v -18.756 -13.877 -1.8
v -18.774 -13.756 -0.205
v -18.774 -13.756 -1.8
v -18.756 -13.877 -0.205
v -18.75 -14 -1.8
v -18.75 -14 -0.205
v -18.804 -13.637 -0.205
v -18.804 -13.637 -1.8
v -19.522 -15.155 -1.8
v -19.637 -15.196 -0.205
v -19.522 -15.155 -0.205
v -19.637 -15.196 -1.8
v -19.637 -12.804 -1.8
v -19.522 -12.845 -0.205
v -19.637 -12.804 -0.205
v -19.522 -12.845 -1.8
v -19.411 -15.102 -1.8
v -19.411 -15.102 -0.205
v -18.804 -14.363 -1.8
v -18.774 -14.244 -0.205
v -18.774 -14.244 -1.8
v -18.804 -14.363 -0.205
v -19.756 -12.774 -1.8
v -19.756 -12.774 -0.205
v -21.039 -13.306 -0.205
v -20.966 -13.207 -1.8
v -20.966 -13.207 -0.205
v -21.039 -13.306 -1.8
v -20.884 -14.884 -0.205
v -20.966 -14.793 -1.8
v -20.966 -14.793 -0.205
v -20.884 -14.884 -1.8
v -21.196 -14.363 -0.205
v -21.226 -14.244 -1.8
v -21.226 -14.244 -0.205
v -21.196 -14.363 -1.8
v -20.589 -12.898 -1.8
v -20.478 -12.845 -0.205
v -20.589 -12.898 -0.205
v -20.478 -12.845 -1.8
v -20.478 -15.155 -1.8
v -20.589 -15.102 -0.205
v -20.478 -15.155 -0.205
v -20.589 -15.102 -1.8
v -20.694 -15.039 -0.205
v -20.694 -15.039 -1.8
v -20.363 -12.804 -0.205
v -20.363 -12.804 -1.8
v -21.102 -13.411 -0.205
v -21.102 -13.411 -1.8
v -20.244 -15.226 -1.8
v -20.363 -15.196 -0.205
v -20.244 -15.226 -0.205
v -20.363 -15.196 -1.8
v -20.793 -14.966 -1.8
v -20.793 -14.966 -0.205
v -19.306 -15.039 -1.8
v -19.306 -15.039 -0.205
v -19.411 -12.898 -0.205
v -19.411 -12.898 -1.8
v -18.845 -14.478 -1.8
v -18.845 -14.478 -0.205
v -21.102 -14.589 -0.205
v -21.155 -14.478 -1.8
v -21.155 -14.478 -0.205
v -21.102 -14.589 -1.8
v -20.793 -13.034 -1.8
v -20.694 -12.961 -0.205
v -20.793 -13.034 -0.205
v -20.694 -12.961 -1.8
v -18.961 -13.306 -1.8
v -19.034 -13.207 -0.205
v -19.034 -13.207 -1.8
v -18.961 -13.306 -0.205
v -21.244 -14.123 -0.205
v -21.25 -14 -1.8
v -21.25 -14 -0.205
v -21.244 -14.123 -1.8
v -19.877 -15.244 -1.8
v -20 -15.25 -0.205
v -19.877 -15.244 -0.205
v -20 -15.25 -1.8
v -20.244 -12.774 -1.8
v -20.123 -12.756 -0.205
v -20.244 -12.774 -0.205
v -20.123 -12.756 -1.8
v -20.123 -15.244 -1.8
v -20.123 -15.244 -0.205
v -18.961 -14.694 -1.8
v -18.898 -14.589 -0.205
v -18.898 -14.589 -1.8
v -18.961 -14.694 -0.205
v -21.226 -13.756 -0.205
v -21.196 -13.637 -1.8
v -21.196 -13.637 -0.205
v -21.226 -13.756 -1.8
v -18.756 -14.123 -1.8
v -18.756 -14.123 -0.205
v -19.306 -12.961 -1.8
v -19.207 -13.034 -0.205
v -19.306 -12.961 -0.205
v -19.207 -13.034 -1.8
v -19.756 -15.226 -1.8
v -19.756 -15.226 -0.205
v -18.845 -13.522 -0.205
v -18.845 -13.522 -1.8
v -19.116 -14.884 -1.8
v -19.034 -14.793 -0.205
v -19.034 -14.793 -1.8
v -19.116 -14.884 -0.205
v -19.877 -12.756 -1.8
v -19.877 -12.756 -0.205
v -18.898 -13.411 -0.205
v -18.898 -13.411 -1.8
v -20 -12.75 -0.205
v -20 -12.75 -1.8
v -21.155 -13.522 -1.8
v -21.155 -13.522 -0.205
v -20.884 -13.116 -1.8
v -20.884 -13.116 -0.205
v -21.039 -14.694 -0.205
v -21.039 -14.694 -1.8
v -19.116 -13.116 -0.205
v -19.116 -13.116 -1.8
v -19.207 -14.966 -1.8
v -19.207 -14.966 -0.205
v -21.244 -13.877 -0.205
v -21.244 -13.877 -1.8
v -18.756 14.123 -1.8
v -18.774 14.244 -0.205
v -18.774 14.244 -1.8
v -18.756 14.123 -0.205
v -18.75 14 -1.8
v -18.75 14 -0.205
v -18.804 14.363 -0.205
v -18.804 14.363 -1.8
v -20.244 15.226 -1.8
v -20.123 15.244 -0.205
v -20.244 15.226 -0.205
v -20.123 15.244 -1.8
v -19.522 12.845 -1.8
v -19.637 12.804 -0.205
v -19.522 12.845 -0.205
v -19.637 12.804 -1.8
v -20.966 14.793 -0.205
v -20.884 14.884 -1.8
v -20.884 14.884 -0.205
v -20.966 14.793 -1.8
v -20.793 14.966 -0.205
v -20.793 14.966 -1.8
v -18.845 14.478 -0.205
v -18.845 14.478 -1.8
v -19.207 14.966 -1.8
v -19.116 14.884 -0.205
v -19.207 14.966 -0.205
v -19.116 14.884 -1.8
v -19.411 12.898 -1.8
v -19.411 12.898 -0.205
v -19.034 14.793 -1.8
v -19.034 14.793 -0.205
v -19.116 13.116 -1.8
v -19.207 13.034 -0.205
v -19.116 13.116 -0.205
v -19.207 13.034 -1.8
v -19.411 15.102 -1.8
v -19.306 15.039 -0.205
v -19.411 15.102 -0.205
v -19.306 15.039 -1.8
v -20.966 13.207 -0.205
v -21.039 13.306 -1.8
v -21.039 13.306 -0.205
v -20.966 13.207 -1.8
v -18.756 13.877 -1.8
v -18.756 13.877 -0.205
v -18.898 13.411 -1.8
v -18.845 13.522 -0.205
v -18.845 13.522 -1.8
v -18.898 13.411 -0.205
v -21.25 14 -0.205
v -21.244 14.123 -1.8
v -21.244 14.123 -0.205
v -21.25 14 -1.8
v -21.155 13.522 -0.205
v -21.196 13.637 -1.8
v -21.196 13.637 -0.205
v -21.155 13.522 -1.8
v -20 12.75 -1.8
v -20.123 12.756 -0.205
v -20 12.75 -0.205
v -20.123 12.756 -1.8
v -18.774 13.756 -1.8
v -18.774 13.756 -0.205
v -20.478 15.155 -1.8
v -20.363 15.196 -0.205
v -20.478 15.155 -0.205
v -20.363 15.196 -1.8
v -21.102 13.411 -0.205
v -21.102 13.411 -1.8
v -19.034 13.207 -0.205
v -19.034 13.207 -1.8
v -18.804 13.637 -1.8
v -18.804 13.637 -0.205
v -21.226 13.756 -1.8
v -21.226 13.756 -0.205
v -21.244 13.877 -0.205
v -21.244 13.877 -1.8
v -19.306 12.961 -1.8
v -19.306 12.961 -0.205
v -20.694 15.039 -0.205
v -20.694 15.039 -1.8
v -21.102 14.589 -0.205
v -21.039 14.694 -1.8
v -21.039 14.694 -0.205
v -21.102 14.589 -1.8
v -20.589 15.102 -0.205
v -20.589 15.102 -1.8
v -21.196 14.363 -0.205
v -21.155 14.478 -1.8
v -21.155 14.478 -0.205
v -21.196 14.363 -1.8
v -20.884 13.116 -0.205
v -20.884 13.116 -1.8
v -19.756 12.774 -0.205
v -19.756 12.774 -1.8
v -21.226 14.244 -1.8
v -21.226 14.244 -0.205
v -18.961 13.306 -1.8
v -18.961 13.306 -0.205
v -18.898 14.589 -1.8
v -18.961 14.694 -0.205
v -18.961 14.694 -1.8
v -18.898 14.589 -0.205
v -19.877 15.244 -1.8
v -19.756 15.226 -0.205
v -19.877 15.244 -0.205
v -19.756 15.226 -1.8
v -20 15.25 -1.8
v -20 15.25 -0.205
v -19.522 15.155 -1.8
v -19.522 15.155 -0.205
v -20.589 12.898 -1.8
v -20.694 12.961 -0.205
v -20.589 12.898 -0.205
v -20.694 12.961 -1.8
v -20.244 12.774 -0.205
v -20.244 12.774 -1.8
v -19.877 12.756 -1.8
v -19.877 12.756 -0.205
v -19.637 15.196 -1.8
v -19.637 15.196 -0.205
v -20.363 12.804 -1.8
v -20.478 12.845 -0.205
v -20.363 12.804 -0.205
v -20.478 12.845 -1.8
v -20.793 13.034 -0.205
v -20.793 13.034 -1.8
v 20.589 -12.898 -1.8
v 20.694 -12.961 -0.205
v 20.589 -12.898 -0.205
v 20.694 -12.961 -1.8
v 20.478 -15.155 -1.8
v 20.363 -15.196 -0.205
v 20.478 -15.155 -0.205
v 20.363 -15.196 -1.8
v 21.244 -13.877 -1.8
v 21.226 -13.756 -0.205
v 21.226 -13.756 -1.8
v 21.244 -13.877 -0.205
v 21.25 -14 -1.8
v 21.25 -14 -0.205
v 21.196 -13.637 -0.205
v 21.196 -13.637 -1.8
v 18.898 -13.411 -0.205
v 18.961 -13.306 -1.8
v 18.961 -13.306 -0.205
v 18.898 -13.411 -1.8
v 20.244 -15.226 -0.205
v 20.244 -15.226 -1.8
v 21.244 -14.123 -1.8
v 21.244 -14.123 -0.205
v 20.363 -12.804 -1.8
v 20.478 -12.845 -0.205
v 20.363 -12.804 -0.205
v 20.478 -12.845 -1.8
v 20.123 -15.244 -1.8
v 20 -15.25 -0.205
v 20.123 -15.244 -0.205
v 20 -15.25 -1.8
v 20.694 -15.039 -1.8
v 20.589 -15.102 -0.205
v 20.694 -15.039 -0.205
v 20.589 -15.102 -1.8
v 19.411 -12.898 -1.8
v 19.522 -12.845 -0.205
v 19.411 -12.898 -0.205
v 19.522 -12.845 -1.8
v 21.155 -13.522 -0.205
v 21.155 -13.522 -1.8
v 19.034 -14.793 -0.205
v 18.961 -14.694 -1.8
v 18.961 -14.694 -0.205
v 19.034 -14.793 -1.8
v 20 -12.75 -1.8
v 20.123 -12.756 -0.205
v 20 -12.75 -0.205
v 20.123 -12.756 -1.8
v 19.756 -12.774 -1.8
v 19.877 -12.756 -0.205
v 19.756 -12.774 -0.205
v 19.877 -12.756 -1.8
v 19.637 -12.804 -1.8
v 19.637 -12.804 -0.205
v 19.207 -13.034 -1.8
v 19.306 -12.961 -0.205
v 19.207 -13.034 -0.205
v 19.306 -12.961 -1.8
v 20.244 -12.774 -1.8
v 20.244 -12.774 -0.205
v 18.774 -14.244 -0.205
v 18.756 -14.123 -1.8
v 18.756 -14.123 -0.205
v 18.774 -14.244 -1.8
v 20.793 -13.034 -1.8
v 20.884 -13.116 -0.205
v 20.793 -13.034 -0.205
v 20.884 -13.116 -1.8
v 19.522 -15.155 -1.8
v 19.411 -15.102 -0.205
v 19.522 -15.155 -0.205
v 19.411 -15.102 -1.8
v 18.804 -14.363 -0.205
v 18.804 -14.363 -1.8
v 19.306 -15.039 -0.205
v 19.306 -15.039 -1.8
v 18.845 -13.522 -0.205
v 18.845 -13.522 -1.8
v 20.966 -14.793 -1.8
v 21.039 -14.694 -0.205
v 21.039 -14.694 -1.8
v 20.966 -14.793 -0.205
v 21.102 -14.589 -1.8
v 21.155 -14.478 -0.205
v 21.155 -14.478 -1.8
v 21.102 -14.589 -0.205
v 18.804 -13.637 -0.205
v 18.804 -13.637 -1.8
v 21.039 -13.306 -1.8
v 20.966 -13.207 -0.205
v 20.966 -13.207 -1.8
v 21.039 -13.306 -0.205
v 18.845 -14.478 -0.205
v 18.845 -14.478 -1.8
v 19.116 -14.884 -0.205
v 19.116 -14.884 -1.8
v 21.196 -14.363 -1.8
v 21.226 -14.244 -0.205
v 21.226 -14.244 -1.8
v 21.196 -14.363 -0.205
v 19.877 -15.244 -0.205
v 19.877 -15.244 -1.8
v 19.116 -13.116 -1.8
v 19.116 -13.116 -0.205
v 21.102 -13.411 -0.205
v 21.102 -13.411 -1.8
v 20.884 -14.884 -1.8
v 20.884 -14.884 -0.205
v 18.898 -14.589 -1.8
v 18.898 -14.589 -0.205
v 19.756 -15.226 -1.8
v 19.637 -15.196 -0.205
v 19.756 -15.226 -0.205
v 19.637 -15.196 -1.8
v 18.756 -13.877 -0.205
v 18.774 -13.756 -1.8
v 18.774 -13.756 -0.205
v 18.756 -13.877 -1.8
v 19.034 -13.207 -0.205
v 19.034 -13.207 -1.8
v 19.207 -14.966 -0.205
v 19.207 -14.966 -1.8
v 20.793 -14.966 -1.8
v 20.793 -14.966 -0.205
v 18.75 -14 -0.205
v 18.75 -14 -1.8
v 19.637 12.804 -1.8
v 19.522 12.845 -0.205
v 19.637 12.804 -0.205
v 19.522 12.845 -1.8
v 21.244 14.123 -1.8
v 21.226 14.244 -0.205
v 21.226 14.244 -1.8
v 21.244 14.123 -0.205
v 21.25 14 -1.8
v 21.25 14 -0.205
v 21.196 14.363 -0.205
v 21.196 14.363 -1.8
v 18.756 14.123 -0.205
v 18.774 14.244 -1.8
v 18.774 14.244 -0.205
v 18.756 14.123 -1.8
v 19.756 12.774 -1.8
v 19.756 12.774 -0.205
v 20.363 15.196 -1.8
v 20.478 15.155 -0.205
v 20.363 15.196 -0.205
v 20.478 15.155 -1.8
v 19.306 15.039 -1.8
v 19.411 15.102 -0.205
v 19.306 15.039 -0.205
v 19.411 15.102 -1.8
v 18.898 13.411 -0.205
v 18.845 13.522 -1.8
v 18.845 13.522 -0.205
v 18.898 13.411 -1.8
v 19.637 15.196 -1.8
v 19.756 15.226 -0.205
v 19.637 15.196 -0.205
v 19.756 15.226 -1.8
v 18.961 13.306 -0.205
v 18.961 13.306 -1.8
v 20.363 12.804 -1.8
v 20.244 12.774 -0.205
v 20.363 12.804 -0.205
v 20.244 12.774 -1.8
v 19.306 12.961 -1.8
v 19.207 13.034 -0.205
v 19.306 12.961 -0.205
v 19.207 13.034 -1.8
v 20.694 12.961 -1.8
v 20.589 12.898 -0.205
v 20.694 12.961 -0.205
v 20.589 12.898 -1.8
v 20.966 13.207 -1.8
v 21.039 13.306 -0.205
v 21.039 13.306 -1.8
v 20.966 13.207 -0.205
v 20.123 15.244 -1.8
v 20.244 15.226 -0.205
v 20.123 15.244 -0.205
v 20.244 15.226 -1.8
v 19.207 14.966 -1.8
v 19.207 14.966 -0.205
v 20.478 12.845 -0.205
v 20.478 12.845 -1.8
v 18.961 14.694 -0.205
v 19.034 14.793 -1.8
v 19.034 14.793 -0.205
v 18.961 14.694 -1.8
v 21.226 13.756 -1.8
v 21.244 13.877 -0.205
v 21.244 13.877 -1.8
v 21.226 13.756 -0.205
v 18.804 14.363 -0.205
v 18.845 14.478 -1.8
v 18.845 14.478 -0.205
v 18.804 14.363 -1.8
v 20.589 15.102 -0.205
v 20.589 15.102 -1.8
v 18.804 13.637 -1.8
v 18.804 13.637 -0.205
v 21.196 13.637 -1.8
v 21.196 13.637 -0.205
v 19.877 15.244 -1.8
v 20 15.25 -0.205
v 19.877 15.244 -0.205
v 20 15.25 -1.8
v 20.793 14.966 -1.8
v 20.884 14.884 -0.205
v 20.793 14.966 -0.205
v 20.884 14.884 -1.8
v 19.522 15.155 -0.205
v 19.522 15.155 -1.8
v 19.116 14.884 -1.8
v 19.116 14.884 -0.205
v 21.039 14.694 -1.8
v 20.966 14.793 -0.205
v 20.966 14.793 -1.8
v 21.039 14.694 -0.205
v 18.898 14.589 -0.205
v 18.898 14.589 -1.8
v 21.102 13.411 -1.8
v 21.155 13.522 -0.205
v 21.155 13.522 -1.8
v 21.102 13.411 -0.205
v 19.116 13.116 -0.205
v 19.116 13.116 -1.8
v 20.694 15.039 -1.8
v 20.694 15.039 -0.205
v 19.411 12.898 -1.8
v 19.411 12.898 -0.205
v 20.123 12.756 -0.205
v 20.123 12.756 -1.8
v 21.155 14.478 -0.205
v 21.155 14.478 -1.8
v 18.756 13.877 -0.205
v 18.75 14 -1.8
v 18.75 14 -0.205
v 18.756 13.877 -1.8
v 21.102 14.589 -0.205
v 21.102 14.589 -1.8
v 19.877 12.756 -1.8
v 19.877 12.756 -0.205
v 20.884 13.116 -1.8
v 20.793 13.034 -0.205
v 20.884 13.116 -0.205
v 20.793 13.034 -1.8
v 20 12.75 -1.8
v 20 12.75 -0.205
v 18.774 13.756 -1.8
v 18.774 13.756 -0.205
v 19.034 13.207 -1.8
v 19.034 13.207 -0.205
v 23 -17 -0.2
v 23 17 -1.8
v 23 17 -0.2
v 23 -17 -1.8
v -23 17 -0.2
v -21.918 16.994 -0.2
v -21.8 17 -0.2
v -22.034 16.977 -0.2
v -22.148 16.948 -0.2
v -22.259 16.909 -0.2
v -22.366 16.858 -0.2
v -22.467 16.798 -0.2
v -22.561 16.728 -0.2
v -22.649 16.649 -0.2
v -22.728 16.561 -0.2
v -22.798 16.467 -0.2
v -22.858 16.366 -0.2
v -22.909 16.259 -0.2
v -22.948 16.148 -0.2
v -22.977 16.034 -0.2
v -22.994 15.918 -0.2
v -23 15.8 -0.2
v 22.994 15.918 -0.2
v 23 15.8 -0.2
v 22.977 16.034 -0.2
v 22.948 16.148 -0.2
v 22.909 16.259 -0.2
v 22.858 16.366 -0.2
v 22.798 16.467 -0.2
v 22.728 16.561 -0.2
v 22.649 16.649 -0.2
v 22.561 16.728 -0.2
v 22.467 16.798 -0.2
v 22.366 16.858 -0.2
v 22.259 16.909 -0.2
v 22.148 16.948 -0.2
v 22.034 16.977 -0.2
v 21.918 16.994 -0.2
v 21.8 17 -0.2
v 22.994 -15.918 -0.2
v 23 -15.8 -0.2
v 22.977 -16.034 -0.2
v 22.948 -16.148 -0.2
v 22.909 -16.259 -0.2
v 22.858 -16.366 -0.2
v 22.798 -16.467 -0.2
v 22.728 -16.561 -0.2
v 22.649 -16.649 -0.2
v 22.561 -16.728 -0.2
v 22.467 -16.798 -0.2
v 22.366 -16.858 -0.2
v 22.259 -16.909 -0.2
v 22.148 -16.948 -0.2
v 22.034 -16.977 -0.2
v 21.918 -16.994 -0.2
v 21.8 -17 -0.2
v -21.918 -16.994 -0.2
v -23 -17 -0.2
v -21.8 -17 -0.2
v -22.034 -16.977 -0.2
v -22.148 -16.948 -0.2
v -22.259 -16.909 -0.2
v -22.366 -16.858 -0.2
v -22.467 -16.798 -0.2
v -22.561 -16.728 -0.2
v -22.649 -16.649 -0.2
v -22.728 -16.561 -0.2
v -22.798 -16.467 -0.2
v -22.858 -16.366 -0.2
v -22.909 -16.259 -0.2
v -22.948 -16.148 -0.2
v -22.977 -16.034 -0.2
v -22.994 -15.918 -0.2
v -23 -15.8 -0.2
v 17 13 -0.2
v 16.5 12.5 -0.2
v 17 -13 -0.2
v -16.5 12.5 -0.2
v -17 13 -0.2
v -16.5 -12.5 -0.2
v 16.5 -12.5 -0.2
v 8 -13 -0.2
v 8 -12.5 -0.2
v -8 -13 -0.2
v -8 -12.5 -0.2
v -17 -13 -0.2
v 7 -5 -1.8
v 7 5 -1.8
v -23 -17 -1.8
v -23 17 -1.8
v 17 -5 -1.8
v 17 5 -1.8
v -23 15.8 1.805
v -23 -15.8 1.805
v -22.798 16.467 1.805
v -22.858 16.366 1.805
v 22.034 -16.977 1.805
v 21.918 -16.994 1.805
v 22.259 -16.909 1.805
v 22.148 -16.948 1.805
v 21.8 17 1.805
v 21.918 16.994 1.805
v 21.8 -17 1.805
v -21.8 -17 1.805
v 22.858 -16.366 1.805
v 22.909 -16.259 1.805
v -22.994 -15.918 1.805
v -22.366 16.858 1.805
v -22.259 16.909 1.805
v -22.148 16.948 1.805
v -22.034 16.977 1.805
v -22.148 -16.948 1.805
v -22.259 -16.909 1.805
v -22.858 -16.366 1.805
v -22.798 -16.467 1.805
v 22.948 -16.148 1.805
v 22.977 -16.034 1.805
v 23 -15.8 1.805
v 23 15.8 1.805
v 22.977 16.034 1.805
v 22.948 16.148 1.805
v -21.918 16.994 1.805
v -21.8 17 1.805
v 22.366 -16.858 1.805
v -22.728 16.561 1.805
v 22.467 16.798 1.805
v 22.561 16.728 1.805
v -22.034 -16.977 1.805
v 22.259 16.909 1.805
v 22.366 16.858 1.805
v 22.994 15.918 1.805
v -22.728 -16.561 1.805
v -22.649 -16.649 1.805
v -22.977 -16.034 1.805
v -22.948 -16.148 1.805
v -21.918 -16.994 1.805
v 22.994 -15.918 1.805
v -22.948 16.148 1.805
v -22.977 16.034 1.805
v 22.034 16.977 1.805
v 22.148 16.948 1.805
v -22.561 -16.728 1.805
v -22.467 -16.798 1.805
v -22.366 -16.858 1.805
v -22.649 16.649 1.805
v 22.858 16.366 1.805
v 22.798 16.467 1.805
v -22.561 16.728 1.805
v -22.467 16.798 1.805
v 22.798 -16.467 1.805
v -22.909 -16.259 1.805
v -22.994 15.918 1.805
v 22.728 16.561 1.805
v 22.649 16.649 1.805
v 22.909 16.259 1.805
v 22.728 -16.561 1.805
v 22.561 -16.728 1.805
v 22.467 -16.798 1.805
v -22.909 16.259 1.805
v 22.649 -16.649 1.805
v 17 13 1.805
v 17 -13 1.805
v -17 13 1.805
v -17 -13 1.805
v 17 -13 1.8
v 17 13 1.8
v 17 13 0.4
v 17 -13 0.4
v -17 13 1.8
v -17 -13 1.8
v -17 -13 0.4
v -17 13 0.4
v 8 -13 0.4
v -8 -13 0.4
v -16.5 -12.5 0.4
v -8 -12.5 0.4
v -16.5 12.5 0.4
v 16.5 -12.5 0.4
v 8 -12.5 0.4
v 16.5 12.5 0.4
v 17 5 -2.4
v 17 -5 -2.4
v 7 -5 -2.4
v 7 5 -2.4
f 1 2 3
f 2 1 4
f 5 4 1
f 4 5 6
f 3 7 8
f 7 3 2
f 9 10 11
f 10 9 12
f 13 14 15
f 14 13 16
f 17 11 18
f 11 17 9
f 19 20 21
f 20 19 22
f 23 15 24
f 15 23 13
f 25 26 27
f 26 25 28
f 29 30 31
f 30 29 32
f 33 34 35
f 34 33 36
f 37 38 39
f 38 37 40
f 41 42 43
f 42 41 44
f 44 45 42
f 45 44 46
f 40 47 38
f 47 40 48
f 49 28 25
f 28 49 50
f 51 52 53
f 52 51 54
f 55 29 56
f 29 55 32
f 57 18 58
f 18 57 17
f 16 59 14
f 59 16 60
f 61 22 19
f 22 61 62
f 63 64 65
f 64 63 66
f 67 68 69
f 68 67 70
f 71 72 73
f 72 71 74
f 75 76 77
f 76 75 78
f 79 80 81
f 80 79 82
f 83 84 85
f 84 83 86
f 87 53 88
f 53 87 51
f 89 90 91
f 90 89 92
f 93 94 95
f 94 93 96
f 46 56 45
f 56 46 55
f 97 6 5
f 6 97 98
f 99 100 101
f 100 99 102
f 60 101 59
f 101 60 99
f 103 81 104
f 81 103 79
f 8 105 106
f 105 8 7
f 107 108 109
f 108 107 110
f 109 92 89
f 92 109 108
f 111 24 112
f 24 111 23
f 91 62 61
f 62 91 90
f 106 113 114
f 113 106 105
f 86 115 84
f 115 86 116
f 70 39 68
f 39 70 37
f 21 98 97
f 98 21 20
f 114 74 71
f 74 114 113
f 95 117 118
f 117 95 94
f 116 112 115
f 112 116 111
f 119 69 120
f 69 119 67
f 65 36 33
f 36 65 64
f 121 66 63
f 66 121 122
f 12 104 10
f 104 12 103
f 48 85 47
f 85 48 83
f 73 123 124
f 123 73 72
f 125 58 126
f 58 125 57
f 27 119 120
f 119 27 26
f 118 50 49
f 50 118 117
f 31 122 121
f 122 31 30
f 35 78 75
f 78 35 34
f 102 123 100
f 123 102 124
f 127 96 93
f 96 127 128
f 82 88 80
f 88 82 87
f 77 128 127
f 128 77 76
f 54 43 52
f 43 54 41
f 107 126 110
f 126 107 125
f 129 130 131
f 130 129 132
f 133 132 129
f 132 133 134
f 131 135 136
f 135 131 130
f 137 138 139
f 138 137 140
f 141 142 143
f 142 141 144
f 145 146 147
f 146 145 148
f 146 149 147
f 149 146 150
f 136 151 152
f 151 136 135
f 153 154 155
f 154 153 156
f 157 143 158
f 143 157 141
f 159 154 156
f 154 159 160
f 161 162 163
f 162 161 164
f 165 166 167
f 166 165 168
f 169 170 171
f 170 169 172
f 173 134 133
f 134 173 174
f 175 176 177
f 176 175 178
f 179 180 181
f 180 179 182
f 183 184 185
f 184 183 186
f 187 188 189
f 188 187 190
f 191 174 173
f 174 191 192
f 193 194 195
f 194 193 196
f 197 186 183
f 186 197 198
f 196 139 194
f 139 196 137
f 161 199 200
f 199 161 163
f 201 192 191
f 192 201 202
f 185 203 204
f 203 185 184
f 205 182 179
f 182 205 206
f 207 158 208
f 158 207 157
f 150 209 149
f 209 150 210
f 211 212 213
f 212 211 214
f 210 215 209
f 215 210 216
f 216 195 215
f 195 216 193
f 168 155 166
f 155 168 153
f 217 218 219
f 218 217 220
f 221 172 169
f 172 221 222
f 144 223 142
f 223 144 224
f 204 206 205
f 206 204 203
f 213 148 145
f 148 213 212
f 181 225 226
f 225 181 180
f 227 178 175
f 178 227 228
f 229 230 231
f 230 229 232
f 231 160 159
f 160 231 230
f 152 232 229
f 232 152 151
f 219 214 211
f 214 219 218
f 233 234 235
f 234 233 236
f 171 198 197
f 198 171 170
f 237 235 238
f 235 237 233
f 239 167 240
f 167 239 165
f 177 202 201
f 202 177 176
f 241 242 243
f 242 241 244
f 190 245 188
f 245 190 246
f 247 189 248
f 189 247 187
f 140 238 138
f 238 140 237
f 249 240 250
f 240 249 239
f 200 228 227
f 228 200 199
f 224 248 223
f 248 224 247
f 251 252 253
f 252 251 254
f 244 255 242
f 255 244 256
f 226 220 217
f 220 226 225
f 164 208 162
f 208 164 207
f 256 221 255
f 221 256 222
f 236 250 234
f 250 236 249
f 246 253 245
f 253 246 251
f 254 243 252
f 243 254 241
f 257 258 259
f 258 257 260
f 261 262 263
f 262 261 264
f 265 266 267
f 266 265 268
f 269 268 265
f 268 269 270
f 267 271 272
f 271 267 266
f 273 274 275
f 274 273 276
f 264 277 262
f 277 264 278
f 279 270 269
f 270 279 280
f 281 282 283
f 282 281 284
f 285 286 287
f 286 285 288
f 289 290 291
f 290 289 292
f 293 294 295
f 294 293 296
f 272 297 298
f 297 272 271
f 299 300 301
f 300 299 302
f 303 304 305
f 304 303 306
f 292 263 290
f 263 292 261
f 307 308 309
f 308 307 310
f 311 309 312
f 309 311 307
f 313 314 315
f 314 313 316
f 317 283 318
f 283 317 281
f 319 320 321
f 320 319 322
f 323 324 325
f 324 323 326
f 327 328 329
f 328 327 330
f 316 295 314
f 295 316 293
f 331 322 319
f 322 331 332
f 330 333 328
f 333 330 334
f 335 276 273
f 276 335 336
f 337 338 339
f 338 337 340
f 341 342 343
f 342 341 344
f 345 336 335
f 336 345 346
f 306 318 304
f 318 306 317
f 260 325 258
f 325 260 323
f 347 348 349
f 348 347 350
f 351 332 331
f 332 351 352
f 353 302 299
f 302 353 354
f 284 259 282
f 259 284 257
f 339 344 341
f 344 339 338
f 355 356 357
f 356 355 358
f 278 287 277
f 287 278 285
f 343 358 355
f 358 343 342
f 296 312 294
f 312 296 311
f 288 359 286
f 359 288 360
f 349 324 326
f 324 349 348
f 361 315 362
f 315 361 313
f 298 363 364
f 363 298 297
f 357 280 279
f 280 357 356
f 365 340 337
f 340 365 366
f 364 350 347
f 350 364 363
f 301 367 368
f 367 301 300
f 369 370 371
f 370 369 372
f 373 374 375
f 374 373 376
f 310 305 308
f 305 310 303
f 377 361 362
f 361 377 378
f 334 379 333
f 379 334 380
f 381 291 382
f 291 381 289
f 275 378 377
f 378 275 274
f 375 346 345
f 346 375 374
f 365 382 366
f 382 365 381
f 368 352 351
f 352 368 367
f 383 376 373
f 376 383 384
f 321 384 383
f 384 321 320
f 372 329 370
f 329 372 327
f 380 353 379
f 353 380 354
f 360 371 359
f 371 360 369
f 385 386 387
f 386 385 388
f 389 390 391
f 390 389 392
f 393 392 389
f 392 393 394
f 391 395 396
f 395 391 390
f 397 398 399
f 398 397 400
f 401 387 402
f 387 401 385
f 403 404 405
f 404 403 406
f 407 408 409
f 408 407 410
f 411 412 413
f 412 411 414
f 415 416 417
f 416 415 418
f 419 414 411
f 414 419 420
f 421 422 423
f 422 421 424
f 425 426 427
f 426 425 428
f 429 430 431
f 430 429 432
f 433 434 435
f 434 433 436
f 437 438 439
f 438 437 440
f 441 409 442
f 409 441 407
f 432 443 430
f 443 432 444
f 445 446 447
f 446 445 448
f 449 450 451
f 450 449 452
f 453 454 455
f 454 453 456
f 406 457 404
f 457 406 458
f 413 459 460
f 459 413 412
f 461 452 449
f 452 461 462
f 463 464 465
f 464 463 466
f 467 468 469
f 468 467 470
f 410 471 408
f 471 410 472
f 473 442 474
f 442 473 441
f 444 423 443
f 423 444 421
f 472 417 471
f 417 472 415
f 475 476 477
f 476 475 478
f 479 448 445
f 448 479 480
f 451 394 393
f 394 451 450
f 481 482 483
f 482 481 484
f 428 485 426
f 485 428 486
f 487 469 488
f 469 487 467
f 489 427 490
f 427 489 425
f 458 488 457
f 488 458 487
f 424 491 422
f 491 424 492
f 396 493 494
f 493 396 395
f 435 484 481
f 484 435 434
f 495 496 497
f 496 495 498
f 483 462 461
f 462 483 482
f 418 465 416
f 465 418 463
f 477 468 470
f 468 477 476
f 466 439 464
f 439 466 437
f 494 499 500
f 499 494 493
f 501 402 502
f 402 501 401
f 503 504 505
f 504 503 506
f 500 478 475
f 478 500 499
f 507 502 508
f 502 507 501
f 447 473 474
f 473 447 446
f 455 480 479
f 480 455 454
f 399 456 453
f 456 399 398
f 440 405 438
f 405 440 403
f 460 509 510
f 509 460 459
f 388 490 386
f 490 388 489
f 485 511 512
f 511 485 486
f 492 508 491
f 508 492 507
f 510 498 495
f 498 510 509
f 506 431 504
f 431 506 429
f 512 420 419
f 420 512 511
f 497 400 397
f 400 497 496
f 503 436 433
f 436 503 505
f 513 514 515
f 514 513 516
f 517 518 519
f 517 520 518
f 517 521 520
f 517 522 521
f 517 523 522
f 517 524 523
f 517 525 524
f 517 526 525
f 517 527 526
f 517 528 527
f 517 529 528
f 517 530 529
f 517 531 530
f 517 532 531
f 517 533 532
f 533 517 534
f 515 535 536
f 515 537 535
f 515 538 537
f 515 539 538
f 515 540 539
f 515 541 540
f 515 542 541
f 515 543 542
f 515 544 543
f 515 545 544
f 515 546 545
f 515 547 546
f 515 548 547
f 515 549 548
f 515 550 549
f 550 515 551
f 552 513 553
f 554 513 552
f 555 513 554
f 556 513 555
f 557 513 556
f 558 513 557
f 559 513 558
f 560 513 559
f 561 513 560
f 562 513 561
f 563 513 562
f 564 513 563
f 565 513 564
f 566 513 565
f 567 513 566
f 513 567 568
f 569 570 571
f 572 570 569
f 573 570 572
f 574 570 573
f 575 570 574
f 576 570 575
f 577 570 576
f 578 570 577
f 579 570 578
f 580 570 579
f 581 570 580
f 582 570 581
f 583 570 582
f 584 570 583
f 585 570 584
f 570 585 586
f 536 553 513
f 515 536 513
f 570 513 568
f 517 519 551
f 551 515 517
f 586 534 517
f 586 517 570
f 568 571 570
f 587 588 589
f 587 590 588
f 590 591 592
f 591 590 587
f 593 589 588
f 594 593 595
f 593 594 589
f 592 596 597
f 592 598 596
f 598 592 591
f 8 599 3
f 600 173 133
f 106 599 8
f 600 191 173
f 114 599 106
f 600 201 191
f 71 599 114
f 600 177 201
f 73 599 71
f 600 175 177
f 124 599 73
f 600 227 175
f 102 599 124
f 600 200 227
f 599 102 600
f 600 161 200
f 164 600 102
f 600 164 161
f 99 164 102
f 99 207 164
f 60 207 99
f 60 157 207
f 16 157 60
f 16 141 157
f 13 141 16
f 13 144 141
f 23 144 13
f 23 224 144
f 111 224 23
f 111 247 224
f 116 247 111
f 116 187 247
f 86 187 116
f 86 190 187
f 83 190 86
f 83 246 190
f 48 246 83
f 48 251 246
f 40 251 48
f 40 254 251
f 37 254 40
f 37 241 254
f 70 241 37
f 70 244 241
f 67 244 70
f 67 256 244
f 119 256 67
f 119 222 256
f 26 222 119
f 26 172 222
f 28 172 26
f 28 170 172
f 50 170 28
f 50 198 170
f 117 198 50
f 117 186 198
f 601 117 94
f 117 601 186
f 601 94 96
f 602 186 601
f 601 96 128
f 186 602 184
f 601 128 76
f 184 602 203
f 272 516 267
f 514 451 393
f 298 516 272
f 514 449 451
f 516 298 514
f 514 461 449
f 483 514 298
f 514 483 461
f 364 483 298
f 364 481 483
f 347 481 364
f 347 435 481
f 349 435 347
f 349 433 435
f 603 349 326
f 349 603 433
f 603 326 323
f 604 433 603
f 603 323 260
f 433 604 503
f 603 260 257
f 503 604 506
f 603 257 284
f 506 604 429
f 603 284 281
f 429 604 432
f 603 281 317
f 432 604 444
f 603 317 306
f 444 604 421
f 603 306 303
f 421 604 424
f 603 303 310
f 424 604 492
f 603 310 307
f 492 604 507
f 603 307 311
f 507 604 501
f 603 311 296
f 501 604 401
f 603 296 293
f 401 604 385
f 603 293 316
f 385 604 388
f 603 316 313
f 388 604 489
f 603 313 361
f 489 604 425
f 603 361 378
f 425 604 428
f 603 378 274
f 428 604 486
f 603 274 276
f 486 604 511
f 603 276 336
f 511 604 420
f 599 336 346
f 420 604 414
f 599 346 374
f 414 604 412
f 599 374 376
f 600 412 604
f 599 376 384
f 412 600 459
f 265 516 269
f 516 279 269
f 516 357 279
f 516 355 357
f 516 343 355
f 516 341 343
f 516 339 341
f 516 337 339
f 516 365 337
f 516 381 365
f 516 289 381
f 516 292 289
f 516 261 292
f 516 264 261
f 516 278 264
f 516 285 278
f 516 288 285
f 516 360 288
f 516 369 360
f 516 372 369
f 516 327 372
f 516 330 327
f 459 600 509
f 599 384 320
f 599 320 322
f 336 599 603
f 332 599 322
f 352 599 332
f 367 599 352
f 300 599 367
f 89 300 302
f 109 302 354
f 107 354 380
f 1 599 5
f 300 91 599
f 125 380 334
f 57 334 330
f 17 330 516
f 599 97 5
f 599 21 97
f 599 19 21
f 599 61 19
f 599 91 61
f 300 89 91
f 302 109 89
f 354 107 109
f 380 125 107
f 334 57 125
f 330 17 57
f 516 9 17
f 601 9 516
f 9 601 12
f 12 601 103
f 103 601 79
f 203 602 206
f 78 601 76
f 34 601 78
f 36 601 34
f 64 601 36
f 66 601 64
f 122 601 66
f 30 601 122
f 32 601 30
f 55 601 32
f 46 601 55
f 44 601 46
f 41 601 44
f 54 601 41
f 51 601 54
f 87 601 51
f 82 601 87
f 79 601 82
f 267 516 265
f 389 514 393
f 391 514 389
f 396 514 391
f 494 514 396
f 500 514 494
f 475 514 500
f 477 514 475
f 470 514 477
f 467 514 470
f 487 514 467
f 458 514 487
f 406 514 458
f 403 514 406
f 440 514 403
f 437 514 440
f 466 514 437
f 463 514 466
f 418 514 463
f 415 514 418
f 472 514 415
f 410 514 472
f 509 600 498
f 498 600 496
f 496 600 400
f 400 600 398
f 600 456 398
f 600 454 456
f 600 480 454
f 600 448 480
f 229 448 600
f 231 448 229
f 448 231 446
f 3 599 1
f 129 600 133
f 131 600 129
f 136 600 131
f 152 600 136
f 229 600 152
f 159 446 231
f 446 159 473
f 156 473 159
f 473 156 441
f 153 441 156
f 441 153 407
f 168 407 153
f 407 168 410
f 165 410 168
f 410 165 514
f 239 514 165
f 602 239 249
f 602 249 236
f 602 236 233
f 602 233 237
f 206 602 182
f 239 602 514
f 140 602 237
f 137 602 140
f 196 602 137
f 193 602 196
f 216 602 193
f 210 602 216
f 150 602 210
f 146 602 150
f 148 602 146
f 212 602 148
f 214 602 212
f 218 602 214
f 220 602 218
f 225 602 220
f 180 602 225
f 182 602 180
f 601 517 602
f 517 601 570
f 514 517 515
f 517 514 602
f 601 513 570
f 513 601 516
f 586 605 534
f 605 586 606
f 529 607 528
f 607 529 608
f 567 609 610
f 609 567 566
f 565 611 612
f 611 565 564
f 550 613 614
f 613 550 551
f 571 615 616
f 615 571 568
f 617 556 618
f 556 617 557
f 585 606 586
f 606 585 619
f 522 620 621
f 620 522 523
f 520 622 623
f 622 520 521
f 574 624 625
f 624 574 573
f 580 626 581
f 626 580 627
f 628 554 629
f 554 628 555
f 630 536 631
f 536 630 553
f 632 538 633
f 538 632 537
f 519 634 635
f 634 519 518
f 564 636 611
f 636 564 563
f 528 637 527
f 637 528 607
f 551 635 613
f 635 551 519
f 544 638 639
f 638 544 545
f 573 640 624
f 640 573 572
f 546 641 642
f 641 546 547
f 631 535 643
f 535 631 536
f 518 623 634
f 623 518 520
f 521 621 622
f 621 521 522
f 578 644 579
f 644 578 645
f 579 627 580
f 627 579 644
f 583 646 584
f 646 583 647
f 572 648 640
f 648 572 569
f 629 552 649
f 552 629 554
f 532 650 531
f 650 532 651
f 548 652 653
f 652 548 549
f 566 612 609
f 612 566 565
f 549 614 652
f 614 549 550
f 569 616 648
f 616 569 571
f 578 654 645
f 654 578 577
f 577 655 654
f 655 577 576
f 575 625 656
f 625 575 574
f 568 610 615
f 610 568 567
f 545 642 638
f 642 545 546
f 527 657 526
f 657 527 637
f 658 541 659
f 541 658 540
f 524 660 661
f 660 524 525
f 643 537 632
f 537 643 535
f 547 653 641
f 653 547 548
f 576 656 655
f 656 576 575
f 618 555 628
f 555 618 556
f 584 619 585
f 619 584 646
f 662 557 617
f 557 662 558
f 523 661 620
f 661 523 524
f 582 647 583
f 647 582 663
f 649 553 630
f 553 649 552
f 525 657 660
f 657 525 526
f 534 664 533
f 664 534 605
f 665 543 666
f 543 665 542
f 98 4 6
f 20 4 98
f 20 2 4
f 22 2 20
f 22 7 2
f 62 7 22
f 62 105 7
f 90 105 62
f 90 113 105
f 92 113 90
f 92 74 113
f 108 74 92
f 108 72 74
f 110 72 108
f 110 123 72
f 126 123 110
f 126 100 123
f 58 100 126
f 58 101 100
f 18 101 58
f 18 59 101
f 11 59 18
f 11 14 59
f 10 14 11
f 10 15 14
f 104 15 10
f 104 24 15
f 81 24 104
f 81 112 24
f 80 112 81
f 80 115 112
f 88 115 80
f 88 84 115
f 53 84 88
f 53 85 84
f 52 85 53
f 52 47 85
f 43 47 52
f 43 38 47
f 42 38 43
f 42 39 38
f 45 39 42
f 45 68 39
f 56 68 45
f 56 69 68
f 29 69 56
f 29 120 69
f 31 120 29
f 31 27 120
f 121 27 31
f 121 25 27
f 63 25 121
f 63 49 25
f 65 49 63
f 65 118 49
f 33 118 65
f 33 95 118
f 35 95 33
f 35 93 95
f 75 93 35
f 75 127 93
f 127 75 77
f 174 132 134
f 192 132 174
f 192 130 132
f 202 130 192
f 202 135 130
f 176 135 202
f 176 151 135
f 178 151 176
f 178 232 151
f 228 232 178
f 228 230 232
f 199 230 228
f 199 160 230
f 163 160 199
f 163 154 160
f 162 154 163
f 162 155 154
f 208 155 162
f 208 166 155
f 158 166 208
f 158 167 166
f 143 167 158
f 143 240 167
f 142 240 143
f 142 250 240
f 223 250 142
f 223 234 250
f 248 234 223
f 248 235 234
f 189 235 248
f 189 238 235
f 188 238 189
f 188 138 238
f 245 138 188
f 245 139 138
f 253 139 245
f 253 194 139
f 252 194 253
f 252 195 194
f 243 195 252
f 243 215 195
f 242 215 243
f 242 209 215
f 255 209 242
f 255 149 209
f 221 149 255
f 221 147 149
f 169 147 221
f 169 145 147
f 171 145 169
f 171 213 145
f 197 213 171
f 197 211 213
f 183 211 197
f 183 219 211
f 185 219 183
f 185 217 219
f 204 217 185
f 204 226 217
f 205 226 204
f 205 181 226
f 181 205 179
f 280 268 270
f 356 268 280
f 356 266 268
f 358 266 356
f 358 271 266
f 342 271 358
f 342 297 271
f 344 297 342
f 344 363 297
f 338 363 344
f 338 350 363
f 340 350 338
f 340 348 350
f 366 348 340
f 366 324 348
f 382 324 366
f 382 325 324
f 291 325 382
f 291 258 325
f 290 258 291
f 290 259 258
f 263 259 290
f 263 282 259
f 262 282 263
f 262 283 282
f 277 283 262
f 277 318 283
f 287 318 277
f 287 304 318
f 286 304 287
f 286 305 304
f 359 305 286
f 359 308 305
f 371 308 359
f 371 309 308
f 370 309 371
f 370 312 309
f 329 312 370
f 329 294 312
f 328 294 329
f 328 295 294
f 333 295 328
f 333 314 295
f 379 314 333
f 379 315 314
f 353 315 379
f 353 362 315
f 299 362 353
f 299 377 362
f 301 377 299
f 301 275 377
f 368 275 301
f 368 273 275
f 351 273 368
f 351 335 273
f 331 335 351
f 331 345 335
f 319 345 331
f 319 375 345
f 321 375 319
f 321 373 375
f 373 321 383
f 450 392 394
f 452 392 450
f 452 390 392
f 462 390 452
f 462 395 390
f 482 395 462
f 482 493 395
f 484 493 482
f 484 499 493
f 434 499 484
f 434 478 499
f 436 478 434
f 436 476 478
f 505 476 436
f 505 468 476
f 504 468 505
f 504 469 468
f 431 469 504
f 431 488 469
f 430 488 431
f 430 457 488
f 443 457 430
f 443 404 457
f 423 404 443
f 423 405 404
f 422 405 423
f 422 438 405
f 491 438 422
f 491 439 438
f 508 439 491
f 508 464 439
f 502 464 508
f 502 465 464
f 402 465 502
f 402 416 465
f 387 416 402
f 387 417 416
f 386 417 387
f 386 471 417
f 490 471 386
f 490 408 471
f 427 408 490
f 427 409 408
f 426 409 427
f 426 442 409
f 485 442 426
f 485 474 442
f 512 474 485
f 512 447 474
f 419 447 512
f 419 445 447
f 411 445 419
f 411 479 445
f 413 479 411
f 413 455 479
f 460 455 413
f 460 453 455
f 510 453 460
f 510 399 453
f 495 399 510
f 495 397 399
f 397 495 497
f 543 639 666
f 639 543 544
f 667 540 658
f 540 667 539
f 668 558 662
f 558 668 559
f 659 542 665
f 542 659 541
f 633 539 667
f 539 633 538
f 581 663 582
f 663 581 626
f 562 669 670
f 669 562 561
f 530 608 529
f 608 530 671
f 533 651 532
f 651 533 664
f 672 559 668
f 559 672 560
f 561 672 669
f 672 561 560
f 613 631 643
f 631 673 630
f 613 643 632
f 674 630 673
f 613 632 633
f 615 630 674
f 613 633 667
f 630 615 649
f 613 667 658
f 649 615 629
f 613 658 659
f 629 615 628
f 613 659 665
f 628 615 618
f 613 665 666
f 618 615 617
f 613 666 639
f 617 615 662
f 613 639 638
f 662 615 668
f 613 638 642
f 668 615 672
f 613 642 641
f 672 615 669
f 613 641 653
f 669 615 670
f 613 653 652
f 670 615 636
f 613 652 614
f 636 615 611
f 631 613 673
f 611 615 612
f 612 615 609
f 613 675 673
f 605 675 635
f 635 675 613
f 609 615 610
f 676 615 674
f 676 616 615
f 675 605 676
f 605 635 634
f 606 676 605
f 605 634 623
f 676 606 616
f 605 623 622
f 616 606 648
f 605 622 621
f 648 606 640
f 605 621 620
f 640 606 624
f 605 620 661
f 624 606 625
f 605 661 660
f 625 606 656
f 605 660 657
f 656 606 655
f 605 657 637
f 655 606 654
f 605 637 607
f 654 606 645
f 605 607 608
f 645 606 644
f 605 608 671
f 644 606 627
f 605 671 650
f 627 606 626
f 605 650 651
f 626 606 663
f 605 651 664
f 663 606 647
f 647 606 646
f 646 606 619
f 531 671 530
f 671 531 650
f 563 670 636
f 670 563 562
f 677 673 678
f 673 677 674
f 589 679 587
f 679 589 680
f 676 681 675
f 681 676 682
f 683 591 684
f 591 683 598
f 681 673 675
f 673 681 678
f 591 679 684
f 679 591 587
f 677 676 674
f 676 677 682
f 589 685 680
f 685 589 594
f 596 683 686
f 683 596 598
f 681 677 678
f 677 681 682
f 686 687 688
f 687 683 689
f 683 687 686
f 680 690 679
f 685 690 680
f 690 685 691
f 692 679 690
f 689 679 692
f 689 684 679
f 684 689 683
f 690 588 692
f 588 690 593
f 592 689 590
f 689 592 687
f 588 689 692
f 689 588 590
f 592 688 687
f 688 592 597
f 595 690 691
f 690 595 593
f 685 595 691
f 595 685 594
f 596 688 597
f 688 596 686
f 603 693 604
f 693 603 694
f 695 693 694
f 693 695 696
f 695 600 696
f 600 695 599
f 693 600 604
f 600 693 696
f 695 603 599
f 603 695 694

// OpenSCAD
$fn = 64;

// =====================
// Parameters (mm)
// =====================
overall_width_mm  = 46.0;   // X
overall_height_mm = 34.0;   // Y
overall_thickness_mm = 6.0; // Z total envelope

pcb_thickness_mm = 1.6;
front_bezel_thickness_mm = 2.0;
bezel_border_mm = 3.0;

screen_aperture_width_mm  = 34.0;
screen_aperture_height_mm = 26.0;
screen_aperture_offset_x_mm = 0.0;
screen_aperture_offset_y_mm = 0.0;

screen_window_thickness_mm = 0.8;
display_layer_thickness_mm = 1.2;

mounting_hole_diameter_mm = 2.5;
mounting_hole_edge_margin_mm = 3.0;

overlap_mm = 0.6;

// Simple connector/FPC feature (approx)
fpc_w_mm = 16.0;
fpc_h_mm = 6.0;
fpc_t_mm = 1.2;
fpc_edge_margin_mm = 2.0;

// =====================
// Derived / sanity
// =====================
module_thickness_mm = pcb_thickness_mm + front_bezel_thickness_mm; // physical stack we model
z0 = -module_thickness_mm/2; // bottom of PCB
pcb_zc   = z0 + pcb_thickness_mm/2;
bezel_zc = z0 + pcb_thickness_mm + front_bezel_thickness_mm/2;

screen_window_zc = z0 + pcb_thickness_mm + front_bezel_thickness_mm - screen_window_thickness_mm/2;
display_layer_zc = z0 + pcb_thickness_mm + front_bezel_thickness_mm - screen_window_thickness_mm - display_layer_thickness_mm/2;

// Keep within requested overall thickness envelope (6mm) by centering the modeled stack
z_shift = 0; // already centered by z0 definition

// =====================
// Geometry helpers
// =====================
module rounded_rect_prism(size=[10,10,1], r=1, center=true) {
    // Minkowski rounded rectangle prism
    // size is outer size; r is corner radius
    sx = size[0]; sy = size[1]; sz = size[2];
    rr = min(r, min(sx,sy)/2 - 0.01);
    translate(center ? [0,0,0] : [sx/2, sy/2, sz/2])
        minkowski() {
            cube([sx-2*rr, sy-2*rr, sz], center=true);
            cylinder(r=rr, h=0.01, center=true);
        }
}

// =====================
// TFT Module (single connected solid)
// =====================
module tft_module() {
    union() {
        // --- PCB with mounting holes (holes are subtracted but solid remains connected)
        difference() {
            color([0.0, 0.45, 0.2])
                translate([0,0,pcb_zc + z_shift])
                    cube([overall_width_mm, overall_height_mm, pcb_thickness_mm], center=true);

            for (x = [-1, 1], y = [-1, 1]) {
                translate([
                    x*(overall_width_mm/2 - mounting_hole_edge_margin_mm),
                    y*(overall_height_mm/2 - mounting_hole_edge_margin_mm),
                    pcb_zc + z_shift
                ])
                    cylinder(r=mounting_hole_diameter_mm/2, h=pcb_thickness_mm + 2*overlap_mm, center=true);
            }
        }

        // --- Bezel frame (with screen aperture cutout)
        difference() {
            color([0.05, 0.05, 0.05])
                translate([0,0,bezel_zc + z_shift])
                    rounded_rect_prism([overall_width_mm, overall_height_mm, front_bezel_thickness_mm], r=1.2, center=true);

            // Screen aperture cut
            translate([screen_aperture_offset_x_mm, screen_aperture_offset_y_mm, bezel_zc + z_shift])
                cube([screen_aperture_width_mm, screen_aperture_height_mm, front_bezel_thickness_mm + 2*overlap_mm], center=true);
        }

        // --- Screen window (glass) - slightly recessed into bezel, overlaps for watertight union
        color([0.15, 0.15, 0.18, 0.9])
            translate([screen_aperture_offset_x_mm, screen_aperture_offset_y_mm, screen_window_zc + z_shift - overlap_mm/2])
                cube([screen_aperture_width_mm, screen_aperture_height_mm, screen_window_thickness_mm + overlap_mm], center=true);

        // --- Display layer behind glass (dark)
        color([0.02, 0.02, 0.02])
            translate([screen_aperture_offset_x_mm, screen_aperture_offset_y_mm, display_layer_zc + z_shift - overlap_mm/2])
                cube([screen_aperture_width_mm - 1.0, screen_aperture_height_mm - 1.0, display_layer_thickness_mm + overlap_mm], center=true);

        // --- Simple FPC/connector feature on back side (connected to PCB)
        // Place at bottom edge (negative Y) on PCB top surface, protruding slightly upward.
        fpc_zc = (z0 + pcb_thickness_mm) + fpc_t_mm/2 - overlap_mm; // overlaps into PCB
        fpc_yc = -overall_height_mm/2 + fpc_h_mm/2 + fpc_edge_margin_mm;
        color([0.85, 0.75, 0.2])
            translate([0, fpc_yc, fpc_zc + z_shift])
                cube([fpc_w_mm, fpc_h_mm, fpc_t_mm], center=true);

        // --- Small stiffener/IC bump on back (connected)
        ic_w = 10; ic_h = 10; ic_t = 1.0;
        ic_zc = z0 + ic_t/2 - overlap_mm; // overlaps into PCB bottom
        color([0.1, 0.1, 0.1])
            translate([overall_width_mm/2 - ic_w/2 - 6, 0, ic_zc + z_shift])
                cube([ic_w, ic_h, ic_t], center=true);
    }
}

// Render
tft_module();
